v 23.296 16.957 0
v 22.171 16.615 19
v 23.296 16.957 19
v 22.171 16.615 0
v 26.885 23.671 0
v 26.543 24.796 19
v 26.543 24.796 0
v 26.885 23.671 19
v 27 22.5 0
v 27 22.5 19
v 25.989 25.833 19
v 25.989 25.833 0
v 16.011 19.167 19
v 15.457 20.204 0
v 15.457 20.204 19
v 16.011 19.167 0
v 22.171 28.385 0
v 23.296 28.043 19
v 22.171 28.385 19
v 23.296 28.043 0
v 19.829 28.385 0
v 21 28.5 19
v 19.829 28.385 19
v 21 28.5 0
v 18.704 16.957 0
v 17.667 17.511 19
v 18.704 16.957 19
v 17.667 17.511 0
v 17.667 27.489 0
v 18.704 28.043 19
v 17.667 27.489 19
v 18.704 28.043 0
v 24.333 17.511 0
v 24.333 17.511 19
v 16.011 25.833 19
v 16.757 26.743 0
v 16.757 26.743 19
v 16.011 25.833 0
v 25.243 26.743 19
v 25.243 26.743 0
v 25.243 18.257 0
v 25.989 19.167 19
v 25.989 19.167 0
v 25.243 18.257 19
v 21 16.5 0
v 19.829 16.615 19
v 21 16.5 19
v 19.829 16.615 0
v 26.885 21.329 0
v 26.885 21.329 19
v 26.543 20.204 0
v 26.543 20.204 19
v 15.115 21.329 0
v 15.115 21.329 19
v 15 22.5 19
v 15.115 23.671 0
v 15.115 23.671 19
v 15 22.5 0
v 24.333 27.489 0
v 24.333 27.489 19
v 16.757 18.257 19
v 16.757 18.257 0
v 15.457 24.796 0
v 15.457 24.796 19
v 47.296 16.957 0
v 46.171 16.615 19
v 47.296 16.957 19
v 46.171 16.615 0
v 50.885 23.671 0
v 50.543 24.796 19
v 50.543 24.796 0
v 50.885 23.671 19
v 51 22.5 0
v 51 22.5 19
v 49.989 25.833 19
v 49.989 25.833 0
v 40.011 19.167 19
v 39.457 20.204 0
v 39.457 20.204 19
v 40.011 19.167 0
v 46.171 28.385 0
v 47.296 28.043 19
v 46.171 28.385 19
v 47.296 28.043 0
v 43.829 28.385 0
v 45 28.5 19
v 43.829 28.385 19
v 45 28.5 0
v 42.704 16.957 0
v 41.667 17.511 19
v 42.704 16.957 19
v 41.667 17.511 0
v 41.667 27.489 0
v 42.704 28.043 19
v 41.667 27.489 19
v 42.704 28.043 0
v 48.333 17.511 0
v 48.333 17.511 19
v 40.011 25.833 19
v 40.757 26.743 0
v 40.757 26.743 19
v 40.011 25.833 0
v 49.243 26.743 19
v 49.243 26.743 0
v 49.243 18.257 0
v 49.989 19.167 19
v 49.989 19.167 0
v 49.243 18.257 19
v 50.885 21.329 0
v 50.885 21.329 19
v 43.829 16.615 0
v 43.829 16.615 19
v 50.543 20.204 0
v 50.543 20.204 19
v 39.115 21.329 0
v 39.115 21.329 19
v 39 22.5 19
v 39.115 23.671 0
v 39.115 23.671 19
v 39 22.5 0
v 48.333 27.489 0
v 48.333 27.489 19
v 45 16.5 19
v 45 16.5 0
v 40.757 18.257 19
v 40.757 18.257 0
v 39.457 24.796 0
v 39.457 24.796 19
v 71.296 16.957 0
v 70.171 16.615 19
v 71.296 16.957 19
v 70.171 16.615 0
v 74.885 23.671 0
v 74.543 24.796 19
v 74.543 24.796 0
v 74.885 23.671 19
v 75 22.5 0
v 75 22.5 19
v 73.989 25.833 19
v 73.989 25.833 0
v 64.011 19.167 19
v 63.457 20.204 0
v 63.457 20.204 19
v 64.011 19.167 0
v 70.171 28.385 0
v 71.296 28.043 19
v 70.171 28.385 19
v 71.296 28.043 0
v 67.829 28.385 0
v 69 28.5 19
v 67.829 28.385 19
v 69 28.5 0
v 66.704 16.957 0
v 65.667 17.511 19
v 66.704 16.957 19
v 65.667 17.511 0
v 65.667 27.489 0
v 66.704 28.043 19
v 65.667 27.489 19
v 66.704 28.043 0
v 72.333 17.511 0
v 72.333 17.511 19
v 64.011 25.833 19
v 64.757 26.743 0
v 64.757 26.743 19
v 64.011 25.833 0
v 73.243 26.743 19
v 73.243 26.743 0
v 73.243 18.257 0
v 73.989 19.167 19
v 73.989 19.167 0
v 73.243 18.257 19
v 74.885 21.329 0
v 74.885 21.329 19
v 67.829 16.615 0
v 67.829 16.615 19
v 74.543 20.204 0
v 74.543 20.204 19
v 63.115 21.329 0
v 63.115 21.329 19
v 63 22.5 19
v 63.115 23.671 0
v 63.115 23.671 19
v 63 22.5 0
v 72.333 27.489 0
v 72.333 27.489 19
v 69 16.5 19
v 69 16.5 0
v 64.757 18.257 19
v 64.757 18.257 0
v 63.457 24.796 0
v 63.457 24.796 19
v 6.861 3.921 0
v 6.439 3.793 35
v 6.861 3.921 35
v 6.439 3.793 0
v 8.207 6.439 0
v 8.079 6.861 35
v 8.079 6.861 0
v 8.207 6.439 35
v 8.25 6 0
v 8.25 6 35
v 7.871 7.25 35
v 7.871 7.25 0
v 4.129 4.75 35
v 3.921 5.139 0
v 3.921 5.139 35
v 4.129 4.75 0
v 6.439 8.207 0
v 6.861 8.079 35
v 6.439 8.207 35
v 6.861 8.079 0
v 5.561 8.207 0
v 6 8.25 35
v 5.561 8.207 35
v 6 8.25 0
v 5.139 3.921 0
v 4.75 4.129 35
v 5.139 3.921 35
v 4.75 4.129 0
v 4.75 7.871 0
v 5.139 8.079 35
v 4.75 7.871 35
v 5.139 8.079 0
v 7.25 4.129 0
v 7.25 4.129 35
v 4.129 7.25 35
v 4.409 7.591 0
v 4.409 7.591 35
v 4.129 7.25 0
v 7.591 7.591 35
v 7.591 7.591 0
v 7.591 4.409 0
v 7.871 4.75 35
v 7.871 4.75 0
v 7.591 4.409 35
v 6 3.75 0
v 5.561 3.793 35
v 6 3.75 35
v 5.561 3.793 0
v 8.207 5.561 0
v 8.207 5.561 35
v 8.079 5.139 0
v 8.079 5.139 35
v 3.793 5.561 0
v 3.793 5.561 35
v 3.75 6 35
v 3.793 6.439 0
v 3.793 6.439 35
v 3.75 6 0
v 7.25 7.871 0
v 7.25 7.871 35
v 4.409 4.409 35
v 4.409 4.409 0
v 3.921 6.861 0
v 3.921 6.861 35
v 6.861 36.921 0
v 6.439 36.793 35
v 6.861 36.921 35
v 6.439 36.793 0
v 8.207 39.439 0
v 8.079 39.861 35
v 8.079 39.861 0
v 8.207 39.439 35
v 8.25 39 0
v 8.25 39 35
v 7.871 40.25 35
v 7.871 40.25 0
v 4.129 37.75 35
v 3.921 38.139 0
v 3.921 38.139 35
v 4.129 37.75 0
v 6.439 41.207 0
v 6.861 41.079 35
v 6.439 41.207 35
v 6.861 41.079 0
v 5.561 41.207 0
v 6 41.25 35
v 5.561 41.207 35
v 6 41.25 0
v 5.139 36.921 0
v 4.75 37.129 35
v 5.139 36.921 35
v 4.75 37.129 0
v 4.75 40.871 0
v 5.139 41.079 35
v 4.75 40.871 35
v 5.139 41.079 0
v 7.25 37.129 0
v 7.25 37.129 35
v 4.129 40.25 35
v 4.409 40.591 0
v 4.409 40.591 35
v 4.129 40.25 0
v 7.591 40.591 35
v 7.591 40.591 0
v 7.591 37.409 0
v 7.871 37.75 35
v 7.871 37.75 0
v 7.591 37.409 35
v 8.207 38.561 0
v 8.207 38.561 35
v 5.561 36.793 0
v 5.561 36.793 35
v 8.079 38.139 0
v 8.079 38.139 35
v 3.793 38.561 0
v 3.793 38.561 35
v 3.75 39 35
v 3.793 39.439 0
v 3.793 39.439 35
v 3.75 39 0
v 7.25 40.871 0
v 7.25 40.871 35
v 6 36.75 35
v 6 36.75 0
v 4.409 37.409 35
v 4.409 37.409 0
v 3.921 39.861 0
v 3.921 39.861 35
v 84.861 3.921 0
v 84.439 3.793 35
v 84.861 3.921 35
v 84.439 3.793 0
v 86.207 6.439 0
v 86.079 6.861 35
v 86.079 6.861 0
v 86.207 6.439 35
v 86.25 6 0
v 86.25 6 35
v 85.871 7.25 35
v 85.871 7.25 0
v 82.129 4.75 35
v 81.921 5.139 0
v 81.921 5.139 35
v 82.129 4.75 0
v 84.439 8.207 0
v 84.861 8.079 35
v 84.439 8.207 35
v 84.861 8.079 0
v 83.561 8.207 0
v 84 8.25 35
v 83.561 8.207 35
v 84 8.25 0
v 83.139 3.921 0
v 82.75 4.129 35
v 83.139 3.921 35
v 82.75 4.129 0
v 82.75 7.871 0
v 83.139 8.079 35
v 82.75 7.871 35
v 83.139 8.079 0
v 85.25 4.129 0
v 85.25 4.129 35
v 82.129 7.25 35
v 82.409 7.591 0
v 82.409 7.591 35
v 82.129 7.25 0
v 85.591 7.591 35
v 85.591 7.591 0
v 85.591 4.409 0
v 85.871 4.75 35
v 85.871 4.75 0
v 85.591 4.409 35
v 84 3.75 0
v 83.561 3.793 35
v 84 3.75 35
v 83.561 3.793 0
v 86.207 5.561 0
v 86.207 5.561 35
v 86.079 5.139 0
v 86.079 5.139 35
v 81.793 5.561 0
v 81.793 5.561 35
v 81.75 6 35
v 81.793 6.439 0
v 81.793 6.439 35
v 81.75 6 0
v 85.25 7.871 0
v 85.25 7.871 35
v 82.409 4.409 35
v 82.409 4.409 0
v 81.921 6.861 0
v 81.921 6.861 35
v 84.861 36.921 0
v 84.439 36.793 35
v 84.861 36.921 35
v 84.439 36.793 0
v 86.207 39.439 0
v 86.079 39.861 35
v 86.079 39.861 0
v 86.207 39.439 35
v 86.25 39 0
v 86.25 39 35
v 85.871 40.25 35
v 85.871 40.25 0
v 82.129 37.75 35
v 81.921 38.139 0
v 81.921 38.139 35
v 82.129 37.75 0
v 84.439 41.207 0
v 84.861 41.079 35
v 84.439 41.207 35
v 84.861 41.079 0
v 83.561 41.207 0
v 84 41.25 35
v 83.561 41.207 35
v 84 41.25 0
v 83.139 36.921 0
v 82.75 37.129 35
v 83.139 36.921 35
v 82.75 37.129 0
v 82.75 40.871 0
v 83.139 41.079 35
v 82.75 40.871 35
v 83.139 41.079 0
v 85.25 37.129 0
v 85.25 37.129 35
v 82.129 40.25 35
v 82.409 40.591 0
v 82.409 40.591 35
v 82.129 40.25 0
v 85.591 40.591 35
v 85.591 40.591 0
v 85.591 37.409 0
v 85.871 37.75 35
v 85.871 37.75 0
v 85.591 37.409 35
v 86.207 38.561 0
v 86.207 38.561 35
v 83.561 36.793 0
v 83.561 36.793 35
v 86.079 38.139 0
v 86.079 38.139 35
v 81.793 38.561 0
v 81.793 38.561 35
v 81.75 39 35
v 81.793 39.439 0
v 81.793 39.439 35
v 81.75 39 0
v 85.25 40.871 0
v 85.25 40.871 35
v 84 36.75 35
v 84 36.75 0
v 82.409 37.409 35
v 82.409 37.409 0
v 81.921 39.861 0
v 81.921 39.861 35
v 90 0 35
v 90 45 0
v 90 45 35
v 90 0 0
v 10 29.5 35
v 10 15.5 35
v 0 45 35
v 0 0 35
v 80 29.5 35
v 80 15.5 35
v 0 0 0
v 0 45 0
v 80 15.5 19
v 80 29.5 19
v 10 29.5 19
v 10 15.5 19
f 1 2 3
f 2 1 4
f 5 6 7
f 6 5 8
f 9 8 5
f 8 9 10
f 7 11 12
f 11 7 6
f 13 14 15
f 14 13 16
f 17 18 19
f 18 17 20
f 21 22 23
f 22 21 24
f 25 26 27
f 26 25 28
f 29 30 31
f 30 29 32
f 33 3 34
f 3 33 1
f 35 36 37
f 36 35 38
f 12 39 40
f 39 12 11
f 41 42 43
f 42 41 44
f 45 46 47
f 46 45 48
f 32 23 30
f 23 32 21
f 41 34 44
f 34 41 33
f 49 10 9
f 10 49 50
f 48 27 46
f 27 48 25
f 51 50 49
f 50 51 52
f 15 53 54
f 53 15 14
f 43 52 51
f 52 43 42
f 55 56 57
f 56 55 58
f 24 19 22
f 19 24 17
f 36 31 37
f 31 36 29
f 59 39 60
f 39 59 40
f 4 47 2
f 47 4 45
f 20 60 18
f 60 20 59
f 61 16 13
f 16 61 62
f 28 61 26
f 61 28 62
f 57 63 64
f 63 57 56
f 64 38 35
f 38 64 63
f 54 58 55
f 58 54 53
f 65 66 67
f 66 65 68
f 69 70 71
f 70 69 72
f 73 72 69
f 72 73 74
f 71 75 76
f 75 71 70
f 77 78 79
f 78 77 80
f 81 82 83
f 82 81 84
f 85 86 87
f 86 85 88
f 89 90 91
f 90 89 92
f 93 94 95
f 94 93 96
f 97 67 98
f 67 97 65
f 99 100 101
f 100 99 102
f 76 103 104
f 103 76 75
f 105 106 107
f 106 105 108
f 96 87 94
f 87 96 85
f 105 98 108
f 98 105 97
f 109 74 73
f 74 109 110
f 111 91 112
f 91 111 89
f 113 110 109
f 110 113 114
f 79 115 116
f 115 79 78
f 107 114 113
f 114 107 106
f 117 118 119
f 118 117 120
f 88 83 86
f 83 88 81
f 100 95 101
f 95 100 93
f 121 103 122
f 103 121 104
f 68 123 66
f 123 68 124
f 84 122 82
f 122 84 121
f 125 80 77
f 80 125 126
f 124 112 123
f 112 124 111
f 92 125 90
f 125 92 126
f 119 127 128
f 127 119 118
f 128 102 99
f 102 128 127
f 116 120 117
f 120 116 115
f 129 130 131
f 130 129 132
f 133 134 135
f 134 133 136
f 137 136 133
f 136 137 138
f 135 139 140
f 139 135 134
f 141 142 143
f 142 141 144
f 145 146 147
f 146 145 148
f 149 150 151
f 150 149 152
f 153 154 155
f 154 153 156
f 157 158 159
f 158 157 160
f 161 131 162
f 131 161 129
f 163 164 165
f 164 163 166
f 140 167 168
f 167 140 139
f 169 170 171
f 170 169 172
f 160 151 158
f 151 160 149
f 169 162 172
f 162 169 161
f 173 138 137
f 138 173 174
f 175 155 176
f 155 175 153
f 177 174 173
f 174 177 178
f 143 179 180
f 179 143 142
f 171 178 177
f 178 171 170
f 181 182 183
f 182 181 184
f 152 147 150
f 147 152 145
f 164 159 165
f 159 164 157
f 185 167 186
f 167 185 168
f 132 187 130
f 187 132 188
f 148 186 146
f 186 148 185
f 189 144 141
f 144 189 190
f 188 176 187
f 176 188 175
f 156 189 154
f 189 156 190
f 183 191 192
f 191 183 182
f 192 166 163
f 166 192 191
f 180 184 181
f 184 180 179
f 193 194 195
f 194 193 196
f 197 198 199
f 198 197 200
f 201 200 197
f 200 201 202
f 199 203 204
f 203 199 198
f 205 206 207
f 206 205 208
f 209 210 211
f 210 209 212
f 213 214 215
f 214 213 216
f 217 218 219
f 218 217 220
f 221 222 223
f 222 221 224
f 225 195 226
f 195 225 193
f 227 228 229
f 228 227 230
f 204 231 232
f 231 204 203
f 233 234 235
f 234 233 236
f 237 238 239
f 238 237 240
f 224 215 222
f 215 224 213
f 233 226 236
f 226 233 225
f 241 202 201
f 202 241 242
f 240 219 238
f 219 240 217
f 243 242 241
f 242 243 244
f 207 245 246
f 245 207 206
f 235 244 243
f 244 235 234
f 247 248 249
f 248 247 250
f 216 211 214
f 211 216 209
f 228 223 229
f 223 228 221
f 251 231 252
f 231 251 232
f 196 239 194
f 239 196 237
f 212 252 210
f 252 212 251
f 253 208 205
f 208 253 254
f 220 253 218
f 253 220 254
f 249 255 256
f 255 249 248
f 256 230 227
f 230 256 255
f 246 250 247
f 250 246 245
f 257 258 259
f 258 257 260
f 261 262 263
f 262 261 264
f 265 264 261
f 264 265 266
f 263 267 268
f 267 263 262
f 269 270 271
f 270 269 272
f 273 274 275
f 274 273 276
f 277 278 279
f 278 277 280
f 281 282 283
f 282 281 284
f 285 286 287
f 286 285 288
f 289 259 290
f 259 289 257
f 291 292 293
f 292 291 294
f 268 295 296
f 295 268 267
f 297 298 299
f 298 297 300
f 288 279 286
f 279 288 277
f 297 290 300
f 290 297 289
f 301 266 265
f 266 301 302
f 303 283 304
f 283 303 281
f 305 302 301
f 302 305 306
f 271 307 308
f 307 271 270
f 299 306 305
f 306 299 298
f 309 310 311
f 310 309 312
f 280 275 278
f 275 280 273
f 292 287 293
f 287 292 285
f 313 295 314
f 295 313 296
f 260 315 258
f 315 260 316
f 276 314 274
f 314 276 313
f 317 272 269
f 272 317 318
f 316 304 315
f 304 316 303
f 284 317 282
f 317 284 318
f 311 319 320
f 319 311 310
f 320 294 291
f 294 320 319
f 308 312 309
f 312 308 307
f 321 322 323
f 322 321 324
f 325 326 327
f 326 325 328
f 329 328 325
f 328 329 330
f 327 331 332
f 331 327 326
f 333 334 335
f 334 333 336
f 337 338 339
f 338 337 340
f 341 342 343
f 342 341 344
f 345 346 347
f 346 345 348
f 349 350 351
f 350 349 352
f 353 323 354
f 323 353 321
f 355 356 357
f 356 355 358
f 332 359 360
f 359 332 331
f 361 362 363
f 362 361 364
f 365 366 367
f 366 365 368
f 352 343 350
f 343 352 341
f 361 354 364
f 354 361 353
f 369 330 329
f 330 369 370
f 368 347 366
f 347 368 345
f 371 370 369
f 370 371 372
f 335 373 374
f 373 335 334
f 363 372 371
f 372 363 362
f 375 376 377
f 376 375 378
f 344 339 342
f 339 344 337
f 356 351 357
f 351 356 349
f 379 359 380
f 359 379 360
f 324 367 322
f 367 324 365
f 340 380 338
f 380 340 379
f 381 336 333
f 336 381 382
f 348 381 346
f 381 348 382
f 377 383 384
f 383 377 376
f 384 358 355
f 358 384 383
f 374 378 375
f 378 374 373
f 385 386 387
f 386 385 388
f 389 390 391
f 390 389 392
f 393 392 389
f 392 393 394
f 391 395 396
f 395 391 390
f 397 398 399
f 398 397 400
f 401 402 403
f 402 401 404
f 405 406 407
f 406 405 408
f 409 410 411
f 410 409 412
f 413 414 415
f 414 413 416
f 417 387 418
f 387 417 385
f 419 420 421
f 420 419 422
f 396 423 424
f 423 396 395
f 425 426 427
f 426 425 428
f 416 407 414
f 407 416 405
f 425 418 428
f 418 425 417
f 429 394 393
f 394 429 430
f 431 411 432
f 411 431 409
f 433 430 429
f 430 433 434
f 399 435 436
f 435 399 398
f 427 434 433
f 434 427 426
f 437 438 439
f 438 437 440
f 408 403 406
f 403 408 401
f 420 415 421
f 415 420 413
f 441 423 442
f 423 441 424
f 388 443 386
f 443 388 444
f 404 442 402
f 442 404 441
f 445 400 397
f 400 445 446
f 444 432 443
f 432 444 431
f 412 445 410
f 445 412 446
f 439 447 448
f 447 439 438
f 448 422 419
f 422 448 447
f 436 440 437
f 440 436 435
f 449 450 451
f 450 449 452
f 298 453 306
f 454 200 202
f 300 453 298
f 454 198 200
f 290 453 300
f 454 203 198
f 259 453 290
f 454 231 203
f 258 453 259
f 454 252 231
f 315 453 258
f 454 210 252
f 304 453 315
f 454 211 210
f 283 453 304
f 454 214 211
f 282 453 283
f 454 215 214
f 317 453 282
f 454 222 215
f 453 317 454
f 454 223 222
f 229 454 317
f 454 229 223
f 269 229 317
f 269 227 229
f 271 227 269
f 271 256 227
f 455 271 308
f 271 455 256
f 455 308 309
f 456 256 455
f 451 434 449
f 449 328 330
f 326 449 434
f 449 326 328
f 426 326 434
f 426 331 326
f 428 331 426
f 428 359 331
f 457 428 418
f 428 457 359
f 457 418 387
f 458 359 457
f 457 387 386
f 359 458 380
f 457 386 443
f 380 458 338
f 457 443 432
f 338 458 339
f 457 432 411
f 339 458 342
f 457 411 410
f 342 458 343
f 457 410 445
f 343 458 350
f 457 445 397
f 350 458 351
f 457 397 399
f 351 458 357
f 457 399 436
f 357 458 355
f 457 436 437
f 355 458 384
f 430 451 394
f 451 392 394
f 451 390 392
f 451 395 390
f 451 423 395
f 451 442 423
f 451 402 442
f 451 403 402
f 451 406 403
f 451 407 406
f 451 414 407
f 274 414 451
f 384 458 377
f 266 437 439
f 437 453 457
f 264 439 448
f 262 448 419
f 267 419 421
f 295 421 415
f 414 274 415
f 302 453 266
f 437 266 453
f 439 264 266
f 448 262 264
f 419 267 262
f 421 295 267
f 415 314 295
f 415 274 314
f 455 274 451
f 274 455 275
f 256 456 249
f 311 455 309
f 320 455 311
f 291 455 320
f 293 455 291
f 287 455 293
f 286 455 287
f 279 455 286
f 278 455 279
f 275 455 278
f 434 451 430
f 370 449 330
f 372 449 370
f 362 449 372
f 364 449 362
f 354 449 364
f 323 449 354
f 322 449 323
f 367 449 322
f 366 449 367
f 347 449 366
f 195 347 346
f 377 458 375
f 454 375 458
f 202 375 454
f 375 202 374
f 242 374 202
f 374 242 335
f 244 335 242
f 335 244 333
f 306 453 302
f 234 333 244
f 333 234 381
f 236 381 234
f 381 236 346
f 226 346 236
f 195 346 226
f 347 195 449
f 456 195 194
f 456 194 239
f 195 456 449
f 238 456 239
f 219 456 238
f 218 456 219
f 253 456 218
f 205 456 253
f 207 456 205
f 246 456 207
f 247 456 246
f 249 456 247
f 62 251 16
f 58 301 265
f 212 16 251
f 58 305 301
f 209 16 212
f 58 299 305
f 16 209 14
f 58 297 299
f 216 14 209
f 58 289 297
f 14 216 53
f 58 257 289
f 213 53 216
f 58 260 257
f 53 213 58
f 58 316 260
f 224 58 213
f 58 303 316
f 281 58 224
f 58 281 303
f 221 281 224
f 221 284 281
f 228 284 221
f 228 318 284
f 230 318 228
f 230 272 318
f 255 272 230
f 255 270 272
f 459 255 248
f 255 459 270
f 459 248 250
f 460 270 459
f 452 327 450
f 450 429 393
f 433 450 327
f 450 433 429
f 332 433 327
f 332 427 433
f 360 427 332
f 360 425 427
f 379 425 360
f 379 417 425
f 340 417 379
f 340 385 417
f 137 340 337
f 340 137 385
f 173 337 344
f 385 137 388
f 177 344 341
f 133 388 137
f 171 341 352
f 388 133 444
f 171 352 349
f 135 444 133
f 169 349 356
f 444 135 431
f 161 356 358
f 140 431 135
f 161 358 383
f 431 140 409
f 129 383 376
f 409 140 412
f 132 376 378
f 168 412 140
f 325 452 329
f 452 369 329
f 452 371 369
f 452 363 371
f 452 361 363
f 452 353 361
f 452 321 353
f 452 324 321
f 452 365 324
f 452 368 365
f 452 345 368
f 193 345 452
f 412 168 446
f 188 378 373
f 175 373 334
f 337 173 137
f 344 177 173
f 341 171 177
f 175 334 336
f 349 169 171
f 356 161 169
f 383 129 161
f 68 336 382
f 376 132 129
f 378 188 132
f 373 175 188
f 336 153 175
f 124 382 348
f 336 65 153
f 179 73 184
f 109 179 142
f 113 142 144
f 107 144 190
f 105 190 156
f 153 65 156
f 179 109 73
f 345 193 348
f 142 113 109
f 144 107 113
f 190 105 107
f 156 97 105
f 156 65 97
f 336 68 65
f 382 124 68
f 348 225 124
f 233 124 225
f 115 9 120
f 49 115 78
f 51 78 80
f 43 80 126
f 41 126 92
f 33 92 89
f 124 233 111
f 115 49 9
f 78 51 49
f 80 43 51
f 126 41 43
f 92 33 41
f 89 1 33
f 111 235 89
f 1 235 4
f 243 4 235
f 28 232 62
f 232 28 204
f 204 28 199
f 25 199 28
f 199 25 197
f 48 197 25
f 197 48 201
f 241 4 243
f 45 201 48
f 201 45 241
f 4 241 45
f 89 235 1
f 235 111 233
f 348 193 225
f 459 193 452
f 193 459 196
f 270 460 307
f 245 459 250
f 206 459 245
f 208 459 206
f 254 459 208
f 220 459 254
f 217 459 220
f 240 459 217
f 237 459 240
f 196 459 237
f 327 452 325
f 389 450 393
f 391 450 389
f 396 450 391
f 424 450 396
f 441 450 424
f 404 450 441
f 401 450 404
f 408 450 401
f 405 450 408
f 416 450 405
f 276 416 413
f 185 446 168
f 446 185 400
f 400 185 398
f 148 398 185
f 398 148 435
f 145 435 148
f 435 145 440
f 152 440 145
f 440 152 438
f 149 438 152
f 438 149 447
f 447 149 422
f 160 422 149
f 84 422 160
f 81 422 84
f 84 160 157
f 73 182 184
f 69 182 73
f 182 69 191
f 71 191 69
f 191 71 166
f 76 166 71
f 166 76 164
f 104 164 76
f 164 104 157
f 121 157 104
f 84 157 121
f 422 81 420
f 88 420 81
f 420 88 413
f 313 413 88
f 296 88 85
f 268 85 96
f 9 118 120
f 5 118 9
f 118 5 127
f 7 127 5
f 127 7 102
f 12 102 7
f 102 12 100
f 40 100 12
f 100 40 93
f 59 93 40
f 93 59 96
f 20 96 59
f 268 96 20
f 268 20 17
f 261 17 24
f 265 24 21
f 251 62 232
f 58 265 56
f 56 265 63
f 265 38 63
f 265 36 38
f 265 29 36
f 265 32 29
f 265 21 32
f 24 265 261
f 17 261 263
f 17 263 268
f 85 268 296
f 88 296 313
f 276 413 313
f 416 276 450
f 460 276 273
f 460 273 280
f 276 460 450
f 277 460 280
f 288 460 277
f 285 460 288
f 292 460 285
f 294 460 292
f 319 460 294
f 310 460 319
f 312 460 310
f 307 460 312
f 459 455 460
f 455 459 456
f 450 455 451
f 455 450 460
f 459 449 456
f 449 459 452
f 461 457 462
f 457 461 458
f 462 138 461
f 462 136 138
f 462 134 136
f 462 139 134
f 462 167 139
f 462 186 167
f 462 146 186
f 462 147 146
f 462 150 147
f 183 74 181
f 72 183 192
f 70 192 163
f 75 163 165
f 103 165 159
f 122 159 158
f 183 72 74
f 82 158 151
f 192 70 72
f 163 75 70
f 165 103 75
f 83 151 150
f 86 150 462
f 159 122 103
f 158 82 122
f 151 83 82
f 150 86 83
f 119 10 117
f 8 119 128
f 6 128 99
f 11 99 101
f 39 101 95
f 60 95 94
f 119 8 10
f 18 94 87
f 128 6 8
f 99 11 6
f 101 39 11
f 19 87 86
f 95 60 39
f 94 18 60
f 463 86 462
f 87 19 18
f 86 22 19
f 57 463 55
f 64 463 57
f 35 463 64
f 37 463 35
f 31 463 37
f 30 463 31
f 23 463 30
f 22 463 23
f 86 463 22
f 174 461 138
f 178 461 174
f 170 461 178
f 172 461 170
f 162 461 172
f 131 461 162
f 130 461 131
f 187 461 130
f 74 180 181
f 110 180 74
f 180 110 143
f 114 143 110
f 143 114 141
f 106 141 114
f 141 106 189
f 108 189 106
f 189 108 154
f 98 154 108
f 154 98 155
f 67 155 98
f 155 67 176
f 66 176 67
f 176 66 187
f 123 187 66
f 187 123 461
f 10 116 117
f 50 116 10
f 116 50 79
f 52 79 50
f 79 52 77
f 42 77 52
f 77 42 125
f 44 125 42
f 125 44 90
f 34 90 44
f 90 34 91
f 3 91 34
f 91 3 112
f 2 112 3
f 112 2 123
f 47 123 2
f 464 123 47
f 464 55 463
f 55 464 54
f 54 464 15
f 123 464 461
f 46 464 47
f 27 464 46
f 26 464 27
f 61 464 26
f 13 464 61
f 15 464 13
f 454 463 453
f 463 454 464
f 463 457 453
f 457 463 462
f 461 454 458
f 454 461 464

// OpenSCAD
$fn = 32;

// ----------------------------------------------------------------------
// Manifold block: gallery_top manifold
// ----------------------------------------------------------------------

// --- parameters (mm) ---
block_l = 90;             // block length, X
block_w = 45;             // block width, Y
block_h = 35;             // block height, Z
port_d = 12;              // port bore diameter
port_pitch = 24;          // port pitch along X
gallery_d = 14;           // top gallery width, Y
gallery_depth = 16;       // gallery pocket depth
wall_p = 10;              // gallery end wall thickness, X
mnt_d = 4.5;              // mounting hole diameter
mnt_in = 6;               // mounting hole inset from the edges

n_ports = 3;  // ports in the row
port_x0 = (block_l - (n_ports - 1) * port_pitch) / 2;  // first port X

difference() {
  cube([block_l, block_w, block_h]);
  for (i = [0 : n_ports - 1])
    translate([port_x0 + i * port_pitch, block_w / 2, -1])
      cylinder(h = block_h + 2, d = port_d);
  translate([wall_p, block_w / 2 - gallery_d / 2, block_h - gallery_depth])
    cube([block_l - 2 * wall_p, gallery_d, gallery_depth + 1]);
  for (cx = [mnt_in, block_l - mnt_in])
    for (cy = [mnt_in, block_w - mnt_in])
      translate([cx, cy, -1]) cylinder(h = block_h + 2, d = mnt_d);
}
